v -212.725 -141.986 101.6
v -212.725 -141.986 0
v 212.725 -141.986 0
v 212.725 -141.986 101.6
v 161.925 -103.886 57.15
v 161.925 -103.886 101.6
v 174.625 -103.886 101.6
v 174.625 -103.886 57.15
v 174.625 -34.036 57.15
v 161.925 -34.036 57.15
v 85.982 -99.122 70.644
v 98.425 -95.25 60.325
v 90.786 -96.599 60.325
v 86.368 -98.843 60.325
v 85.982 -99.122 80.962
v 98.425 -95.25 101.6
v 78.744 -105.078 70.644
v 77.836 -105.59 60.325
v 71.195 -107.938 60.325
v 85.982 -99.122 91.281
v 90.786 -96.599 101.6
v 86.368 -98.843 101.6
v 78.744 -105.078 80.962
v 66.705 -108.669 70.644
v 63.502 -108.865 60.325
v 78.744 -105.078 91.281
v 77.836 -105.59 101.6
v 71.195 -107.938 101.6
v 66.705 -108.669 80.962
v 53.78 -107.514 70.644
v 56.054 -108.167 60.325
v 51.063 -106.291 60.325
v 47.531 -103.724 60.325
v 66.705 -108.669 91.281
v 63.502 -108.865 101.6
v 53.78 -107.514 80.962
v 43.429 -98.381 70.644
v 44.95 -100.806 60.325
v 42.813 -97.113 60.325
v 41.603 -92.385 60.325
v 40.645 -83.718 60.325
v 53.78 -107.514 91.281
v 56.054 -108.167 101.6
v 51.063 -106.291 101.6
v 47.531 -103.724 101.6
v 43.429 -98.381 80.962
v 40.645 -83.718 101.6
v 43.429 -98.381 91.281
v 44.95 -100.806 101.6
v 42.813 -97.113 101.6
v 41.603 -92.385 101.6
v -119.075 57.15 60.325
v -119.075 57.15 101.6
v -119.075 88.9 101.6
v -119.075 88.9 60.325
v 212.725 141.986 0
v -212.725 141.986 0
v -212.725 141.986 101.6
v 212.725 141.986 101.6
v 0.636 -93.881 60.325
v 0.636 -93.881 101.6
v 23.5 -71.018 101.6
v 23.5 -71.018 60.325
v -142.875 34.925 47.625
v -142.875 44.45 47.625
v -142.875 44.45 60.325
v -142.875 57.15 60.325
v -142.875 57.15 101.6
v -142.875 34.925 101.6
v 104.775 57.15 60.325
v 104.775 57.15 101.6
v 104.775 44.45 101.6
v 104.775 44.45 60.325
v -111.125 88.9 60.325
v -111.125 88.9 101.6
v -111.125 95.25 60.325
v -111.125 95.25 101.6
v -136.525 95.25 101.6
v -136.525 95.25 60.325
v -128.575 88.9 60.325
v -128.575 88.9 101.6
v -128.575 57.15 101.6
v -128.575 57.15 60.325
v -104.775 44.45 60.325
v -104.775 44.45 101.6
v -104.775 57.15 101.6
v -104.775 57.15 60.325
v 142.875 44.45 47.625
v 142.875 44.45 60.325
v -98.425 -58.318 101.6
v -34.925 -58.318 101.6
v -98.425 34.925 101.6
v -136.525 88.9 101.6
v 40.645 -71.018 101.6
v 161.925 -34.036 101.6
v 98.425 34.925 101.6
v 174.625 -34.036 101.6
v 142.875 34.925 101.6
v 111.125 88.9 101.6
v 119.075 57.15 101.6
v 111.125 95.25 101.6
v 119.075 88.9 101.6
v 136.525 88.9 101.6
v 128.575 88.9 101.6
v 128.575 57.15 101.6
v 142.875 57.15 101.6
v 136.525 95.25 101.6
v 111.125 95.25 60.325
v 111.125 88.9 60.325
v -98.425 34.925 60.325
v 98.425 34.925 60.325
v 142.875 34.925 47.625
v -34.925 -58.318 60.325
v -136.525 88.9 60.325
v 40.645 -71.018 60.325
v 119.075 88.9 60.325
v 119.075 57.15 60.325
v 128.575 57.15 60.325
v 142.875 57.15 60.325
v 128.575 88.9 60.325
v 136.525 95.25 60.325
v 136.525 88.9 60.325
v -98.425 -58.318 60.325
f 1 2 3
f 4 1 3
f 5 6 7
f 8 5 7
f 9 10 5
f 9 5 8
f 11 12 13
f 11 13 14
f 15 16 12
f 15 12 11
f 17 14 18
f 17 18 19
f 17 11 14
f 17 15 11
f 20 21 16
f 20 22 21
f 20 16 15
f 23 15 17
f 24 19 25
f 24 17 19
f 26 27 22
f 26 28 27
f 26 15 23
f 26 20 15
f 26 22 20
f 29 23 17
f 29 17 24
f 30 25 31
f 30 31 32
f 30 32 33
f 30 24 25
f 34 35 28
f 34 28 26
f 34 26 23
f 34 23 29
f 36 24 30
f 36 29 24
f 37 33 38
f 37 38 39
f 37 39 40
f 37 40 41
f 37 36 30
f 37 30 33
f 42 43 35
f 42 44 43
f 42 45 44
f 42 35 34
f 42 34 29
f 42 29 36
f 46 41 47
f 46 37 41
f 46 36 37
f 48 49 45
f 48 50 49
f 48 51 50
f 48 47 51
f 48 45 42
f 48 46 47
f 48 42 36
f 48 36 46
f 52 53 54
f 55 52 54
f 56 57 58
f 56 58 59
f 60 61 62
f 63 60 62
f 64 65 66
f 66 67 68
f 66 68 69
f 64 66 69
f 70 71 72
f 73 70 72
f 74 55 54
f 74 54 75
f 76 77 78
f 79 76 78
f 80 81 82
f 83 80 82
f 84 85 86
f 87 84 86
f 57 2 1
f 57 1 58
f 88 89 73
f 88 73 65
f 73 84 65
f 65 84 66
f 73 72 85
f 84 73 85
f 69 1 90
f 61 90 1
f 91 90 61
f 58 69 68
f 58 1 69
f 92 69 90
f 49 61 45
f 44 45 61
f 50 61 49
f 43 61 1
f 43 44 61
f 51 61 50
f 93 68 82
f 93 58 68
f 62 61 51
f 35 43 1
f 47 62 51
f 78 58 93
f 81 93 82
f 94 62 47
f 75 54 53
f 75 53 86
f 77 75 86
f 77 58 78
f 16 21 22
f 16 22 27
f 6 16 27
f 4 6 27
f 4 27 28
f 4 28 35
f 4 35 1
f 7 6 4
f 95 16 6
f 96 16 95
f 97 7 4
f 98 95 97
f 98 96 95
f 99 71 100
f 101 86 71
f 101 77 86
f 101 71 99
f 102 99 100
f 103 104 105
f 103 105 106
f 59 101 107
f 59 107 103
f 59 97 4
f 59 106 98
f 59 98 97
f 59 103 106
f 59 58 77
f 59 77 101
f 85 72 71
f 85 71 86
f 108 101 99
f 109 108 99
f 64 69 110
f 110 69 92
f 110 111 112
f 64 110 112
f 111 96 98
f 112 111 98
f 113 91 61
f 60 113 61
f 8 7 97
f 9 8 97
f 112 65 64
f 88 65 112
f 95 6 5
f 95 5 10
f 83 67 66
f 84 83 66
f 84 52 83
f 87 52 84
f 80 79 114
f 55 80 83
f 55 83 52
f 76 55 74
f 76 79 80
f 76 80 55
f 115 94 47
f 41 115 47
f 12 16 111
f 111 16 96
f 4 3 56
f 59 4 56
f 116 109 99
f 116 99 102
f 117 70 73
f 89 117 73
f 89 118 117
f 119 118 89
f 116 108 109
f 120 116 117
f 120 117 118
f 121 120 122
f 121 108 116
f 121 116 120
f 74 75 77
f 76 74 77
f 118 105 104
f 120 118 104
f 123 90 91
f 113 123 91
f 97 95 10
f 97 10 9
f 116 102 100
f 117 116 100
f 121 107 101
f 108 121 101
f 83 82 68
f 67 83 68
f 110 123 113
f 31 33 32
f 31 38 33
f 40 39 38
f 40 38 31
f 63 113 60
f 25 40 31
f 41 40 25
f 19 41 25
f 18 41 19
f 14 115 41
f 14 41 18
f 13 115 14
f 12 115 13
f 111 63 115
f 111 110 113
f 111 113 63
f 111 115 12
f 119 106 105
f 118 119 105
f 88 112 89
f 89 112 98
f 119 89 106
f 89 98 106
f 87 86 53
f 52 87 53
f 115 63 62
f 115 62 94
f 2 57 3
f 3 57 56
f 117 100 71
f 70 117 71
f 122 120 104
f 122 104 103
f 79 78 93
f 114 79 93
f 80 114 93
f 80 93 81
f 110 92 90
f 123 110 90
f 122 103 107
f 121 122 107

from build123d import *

# Parameters (mm, degrees)
F0_W     = 425.45
F0_H     = 283.972
F1_DEPTH = 101.6
F3_DEPTH = 41.275
F2_W     = 12.7
F2_H     = 69.85
F4_DEPTH = 44.45
F6_DEPTH = 12.7


with BuildPart() as f1:
    # F0 (on Top) → F1 (new body)
    with BuildSketch(Plane.XY):
        Rectangle(F0_W, F0_H)
    extrude(amount=F1_DEPTH)

    # F2 (on face) → F3 (cut)
    with BuildSketch(Plane.XY.offset(101.6)):
        with BuildLine():
            Line((104.775, 57.15), (104.775, 44.45))
            Line((104.775, 44.45), (-104.775, 44.45))
            Line((-104.775, 44.45), (-104.775, 57.15))
            Line((-104.775, 57.15), (-119.0752, 57.15))
            Line((-119.0752, 57.15), (-119.0752, 88.9))
            Line((-119.0752, 88.9), (-111.125, 88.9))
            Line((-111.125, 88.9), (-111.125, 95.25))
            Line((-111.125, 95.25), (-136.525, 95.25))
            Line((-136.525, 95.25), (-136.525, 88.9))
            Line((-136.525, 88.9), (-128.5748, 88.9))
            Line((-128.5748, 88.9), (-128.5748, 57.15))
            Line((-128.5748, 57.15), (-142.875, 57.15))
            Line((-142.875, 57.15), (-142.875, 34.925))
            Line((-142.875, 34.925), (-98.425, 34.925))
            Line((-98.425, 34.925), (-98.425, -58.3184))
            Line((-98.425, -58.3184), (-34.925, -58.3184))
            Line((-34.925, -58.3184), (0.6356468836, -93.881381557))
            Line((0.6356468836, -93.881381557), (23.5001294705, -71.0184))
            Line((23.5001294705, -71.0184), (40.6451294705, -71.0184))
            Line((40.6451294705, -71.0184), (40.6451294705, -83.7184))
            add(Edge.make_bspline(
                [(98.425, -95.25), (85.7012200048, -95.9646103609), (83.2737472807, -107.5863293593), (52.6561842817, -111.0807364969), (41.7633484197, -97.2699226213), (41.6022054851, -92.9006263614), (40.6451294705, -83.7184)],
                knots=[0, 0, 0, 0, 0.2714742221, 0.5613518333, 0.7763996456, 1, 1, 1, 1], degree=3))
            Line((98.425, -95.25), (98.425, 34.925))
            Line((98.425, 34.925), (142.875, 34.925))
            Line((142.875, 34.925), (142.875, 57.15))
            Line((142.875, 57.15), (128.5748, 57.15))
            Line((128.5748, 57.15), (128.5748, 88.9))
            Line((128.5748, 88.9), (136.525, 88.9))
            Line((136.525, 88.9), (136.525, 95.25))
            Line((136.525, 95.25), (111.125, 95.25))
            Line((111.125, 95.25), (111.125, 88.9))
            Line((111.125, 88.9), (119.0752, 88.9))
            Line((119.0752, 88.9), (119.0752, 57.15))
            Line((119.0752, 57.15), (104.775, 57.15))
        make_face()
    extrude(amount=-F3_DEPTH, mode=Mode.SUBTRACT)

    # F2 (on face) → F4 (cut)
    with BuildSketch(Plane.XY.offset(101.6)):
        with Locations((168.275, -68.961)):
            Rectangle(F2_W, F2_H)
    extrude(amount=-F4_DEPTH, mode=Mode.SUBTRACT)

    # F5 (on face) → F6 (cut)
    with BuildSketch(Plane.XY.offset(60.325)):
        Polygon((-142.875, 44.45), (-142.875, 34.925), (-98.425, 34.925), (98.425, 34.925), (142.875, 34.925), (142.875, 44.45), (104.775, 44.45), (-104.775, 44.45), align=None)
    extrude(amount=-F6_DEPTH, mode=Mode.SUBTRACT)


solid = f1.part
